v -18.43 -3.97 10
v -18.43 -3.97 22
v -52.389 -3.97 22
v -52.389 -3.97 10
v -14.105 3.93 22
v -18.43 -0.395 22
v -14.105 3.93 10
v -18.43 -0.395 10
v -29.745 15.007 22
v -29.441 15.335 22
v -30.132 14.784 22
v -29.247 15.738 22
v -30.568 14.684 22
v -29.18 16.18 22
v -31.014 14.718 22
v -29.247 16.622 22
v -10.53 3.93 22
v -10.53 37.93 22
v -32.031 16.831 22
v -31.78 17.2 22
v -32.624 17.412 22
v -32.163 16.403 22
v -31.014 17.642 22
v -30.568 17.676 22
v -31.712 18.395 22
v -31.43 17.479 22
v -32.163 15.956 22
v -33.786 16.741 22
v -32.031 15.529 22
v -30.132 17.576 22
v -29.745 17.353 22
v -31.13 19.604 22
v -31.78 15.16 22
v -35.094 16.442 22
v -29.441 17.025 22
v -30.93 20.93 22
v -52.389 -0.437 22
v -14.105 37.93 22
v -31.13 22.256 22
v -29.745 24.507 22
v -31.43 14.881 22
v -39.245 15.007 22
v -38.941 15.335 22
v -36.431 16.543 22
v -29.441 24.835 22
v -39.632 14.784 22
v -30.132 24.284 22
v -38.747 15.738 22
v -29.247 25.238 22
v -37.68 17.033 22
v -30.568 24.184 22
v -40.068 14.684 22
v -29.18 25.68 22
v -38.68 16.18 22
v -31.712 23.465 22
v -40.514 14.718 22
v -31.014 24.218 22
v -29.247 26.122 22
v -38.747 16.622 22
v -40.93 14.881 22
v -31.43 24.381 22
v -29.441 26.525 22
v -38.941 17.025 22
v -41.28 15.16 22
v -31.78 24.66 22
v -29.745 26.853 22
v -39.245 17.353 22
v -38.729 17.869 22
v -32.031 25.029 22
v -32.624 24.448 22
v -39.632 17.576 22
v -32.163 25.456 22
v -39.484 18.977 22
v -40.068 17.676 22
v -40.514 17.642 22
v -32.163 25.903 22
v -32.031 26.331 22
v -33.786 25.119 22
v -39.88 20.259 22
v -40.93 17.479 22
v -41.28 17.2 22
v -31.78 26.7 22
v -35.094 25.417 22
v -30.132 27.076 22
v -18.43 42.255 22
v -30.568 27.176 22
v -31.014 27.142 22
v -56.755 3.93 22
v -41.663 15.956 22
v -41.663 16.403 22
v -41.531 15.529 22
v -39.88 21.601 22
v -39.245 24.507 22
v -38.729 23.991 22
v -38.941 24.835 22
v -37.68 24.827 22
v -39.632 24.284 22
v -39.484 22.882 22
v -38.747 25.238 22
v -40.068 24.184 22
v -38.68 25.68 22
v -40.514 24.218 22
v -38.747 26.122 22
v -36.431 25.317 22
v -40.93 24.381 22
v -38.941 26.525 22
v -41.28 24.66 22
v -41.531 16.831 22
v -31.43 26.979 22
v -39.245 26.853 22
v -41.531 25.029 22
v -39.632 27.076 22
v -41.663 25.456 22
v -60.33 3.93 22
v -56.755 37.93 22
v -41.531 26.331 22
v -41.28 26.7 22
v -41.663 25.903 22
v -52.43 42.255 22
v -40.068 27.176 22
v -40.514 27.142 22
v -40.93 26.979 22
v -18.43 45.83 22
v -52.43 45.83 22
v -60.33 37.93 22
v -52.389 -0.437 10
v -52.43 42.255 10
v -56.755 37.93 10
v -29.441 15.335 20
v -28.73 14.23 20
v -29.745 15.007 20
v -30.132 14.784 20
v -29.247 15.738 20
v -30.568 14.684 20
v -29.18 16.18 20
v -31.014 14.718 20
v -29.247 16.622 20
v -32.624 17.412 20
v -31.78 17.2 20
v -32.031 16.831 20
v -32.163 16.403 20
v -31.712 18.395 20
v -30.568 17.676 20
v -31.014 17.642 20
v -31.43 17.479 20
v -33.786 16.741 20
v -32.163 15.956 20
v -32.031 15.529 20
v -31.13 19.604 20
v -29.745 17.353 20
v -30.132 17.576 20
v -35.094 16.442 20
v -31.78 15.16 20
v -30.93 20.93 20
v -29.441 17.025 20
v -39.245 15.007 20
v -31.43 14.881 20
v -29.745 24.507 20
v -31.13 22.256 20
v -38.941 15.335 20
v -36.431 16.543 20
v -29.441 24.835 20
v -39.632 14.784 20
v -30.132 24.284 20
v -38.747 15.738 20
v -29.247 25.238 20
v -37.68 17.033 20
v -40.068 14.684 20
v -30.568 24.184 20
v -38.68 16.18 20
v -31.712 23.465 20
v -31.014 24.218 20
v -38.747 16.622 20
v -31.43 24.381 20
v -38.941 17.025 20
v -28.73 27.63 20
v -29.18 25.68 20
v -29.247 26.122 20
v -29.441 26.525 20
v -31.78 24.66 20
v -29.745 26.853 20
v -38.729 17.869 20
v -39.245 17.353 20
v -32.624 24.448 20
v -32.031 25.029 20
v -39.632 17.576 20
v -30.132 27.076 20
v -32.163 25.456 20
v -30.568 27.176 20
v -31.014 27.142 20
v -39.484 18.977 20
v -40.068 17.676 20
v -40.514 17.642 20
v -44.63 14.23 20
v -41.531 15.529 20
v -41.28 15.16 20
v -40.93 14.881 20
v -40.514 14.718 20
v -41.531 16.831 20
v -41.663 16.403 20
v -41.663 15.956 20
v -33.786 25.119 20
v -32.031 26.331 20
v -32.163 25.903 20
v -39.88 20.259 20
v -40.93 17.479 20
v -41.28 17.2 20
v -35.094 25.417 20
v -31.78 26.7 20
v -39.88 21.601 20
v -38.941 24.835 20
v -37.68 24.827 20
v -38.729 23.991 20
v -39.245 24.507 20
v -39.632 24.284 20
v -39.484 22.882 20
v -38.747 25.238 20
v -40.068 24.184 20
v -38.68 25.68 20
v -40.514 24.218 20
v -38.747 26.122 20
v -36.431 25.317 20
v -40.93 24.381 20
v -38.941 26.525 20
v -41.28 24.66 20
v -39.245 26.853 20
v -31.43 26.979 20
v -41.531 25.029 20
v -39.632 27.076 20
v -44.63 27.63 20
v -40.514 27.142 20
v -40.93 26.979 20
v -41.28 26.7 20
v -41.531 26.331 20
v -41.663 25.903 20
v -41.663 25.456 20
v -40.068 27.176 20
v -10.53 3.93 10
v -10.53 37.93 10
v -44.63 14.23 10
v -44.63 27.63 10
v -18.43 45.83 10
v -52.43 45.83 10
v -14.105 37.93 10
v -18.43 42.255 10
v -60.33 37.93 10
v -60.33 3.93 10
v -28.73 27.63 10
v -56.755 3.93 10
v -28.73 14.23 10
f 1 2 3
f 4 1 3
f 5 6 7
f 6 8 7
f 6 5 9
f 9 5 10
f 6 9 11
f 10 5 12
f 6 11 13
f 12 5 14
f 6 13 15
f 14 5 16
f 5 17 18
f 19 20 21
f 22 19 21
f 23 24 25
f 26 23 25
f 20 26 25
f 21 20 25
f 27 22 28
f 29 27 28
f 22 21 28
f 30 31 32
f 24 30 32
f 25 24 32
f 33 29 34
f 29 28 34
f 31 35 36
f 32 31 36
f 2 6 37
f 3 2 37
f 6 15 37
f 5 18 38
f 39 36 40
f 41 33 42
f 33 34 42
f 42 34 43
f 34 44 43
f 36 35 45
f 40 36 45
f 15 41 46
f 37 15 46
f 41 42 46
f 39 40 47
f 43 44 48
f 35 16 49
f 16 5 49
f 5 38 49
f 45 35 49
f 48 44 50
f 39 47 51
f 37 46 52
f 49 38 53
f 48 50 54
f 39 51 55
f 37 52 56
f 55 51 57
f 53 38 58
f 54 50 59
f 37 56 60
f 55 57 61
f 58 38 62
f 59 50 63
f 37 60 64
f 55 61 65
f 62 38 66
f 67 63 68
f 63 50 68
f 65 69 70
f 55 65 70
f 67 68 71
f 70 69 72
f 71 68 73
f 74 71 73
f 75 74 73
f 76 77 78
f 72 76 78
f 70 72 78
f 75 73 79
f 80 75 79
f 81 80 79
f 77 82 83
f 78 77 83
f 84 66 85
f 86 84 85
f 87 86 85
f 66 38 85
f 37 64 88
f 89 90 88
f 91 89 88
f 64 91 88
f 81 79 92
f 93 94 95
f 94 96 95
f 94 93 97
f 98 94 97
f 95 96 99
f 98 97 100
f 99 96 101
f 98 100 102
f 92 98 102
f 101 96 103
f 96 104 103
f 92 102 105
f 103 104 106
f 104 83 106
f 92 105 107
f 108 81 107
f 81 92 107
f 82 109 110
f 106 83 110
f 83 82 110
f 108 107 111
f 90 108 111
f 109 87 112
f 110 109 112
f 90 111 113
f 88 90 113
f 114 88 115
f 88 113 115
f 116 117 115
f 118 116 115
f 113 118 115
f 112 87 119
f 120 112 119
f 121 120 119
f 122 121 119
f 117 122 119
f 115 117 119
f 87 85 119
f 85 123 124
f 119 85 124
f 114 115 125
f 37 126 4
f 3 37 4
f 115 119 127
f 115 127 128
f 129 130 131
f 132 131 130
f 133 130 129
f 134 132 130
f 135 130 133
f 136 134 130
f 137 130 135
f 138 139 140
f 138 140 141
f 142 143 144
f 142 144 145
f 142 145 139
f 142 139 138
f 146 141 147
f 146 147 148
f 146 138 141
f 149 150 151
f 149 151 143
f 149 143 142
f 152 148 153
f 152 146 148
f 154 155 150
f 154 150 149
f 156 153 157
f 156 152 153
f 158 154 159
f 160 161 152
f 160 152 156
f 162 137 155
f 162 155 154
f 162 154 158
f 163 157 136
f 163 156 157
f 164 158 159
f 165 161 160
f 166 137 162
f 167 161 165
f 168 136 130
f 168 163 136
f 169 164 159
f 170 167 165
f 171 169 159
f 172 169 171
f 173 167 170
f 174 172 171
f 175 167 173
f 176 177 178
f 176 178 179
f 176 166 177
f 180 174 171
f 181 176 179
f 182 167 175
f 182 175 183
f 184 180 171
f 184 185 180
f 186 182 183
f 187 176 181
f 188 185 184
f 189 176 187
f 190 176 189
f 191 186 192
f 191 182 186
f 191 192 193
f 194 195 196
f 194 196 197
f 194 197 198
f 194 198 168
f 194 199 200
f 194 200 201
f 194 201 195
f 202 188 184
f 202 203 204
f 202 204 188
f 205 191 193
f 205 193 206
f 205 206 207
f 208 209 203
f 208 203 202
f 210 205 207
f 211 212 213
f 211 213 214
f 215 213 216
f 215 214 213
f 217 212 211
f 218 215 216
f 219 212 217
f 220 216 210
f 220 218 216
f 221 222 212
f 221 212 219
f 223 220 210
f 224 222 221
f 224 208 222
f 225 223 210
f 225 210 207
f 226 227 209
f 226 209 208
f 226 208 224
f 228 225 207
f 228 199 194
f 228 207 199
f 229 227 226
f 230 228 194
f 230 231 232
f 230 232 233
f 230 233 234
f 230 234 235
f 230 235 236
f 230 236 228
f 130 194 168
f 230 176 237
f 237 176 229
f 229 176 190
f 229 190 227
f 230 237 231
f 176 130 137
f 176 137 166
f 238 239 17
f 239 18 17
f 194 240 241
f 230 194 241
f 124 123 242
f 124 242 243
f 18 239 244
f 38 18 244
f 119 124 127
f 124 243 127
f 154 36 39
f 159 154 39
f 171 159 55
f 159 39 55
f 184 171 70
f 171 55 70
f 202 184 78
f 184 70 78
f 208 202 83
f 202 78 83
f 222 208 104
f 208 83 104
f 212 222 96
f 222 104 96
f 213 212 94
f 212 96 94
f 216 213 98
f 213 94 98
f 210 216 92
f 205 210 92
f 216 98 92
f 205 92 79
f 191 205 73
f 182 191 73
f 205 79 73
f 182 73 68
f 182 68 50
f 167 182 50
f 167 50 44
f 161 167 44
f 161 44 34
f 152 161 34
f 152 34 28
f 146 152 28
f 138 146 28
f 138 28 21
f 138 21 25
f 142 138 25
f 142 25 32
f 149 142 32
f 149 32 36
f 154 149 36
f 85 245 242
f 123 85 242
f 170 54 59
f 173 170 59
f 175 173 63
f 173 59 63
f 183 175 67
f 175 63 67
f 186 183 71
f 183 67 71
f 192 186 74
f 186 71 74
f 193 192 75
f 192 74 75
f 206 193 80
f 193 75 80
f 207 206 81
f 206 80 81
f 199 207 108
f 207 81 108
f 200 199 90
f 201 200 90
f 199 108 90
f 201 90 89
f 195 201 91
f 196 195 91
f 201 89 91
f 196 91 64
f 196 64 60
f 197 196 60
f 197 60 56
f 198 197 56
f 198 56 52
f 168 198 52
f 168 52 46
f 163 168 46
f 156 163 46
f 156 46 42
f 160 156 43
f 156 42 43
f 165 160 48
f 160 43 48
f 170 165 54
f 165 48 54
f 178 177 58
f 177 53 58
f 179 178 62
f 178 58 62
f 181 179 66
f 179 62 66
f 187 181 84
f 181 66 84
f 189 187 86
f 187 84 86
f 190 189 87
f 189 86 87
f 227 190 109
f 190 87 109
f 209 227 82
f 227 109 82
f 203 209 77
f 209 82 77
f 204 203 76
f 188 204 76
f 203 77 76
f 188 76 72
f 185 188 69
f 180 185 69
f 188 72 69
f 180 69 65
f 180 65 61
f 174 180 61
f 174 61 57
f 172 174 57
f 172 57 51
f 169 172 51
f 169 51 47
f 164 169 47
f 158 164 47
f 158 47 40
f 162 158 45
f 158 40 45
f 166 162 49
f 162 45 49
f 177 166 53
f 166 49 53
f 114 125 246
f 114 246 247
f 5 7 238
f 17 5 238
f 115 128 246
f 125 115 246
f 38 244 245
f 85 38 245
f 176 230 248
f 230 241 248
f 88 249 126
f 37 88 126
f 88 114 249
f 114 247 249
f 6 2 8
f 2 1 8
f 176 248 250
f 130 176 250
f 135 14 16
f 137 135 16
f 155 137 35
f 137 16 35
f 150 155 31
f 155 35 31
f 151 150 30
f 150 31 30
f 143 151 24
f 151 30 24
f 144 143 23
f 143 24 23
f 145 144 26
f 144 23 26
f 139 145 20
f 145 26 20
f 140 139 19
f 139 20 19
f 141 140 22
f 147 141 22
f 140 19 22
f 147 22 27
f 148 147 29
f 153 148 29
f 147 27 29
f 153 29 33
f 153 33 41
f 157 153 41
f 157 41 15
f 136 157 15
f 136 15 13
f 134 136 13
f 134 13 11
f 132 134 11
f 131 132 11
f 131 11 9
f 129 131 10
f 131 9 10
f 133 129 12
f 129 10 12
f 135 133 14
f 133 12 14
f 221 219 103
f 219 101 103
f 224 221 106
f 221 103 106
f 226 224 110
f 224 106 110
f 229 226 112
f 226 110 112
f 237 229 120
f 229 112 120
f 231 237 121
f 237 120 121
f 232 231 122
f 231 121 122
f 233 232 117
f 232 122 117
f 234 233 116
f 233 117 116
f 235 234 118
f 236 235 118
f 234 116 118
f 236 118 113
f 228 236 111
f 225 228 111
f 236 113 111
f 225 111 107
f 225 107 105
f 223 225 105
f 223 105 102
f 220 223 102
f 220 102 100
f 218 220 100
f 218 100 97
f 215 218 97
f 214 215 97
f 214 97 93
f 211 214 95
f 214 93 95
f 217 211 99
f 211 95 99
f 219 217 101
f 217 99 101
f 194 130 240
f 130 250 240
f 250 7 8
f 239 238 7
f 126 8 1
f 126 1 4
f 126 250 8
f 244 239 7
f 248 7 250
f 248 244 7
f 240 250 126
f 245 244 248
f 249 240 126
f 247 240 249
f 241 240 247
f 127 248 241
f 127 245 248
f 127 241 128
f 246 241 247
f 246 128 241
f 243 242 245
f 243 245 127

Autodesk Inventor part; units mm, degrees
ref_plane "YZ Plane" through (0, 0, 0) normal (1, 0, 0) x (0, 1, 0)
ref_plane "XZ Plane" through (0, 0, 0) normal (0, 1, 0) x (-1, 0, 0)
ref_plane "Work Plane1" through (-56.3599, 0, 22) normal (0, 0, -1) x (-1, 0, 0)
sketch "Sketch1" plane through (-56.3599, 0, 22) normal (0, 0, -1) x (-1, 0, 0)
  line L0 (-4.0299, -0.3538) -> (-2.2322, 1.4439) construction
  arc A0 (-1.4439, 2.2322) -> (-2.2322, 1.4439) centre (-0.9299, 0.9299) ccw construction
  line L1 (-1.4439, 2.2322) -> (0.3538, 4.0299) construction
  line L2 (-37.8299, 42.8299) -> (-37.8299, 37.8299) construction
  line L3 (-37.8299, 37.8299) -> (-42.9208, 37.8299) construction
  line L4 (-37.8299, 42.2137) -> (-37.8299, 45.8299) construction
  line L5 (-37.8299, 45.8299) -> (-4.0299, 45.8299) construction
  line L6 (-4.0299, 45.8299) -> (-4.0299, 42.2137) construction
  line L7 (-4.0299, 4.0299) -> (0.3538, 4.0299) projected
  circle A1 centre (-20.9299, 20.9299) radius 17.5 projected
  line L8 (-20.9299, 58.9723) -> (17.1124, 20.9299) construction
  line L9 (17.1124, 20.9299) -> (-20.9299, -17.1124) construction
  line L10 (-20.9299, -17.1124) -> (-58.9723, 20.9299) construction
  line L11 (-58.9723, 20.9299) -> (-20.9299, 58.9723) construction
  line L12 (-20.9299, 58.9723) -> (-20.9299, -17.1124) construction
  line L13 (17.1124, 20.9299) -> (-58.9723, 20.9299) construction
  line L14 (-20.9299, 58.9723) -> (32.8701, 58.9723) construction
  line L15 (-43.4299, 43.4299) -> (1.5701, 43.4299) construction
  line L16 (1.5701, 43.4299) -> (1.5701, -1.5701) construction
  line L17 (1.5701, -1.5701) -> (-43.4299, -1.5701) construction
  line L18 (-43.4299, -1.5701) -> (-43.4299, 43.4299) construction
  line L19 (-43.4299, 43.4299) -> (1.5701, -1.5701) construction
  line L20 (1.5701, 43.4299) -> (-43.4299, -1.5701) construction
  line L21 (-43.4299, 5.3876) -> (-43.4299, 36.4723)
  line L22 (-43.4299, 36.4723) -> (-36.4723, 43.4299)
  line L23 (-36.4723, 43.4299) -> (-5.3876, 43.4299)
  line L24 (-5.3876, 43.4299) -> (1.5701, 36.4723)
  line L25 (1.5701, 36.4723) -> (1.5701, 5.3876)
  line L26 (1.5701, 5.3876) -> (-5.3876, -1.5701)
  line L27 (-5.3876, -1.5701) -> (-36.4723, -1.5701)
  line L28 (-36.4723, -1.5701) -> (-43.4299, 5.3876)
  line L29 (-4.0299, 42.2137) -> (-37.8299, 42.2137) projected
  line L30 (-4.0299, -0.3538) -> (-4.0299, 4.0299) projected
  circle A2 centre (-20.9299, 20.9299) radius 1.5
  line L31 (-10.9299, 10.9299) -> (-30.9299, 10.9299) construction
  line L32 (-30.9299, 10.9299) -> (-30.9299, 30.9299) construction
  line L33 (-30.9299, 30.9299) -> (-10.9299, 30.9299) construction
  line L34 (-10.9299, 30.9299) -> (-10.9299, 10.9299) construction
  line L35 (-10.9299, 10.9299) -> (-30.9299, 30.9299) construction
  line L36 (-30.9299, 10.9299) -> (-10.9299, 30.9299) construction
  circle A3 centre (-30.9299, 30.9299) radius 1.4
  circle A4 centre (-30.9299, 10.9299) radius 1.4
  circle A5 centre (-10.9299, 10.9299) radius 1.4
  line L37 (-45.8299, 37.8299) -> (-42.0723, 37.8299) construction
  line L38 (-42.1723, 37.7299) -> (-45.8299, 37.7299)
  line L39 (-45.8299, 37.7299) -> (-45.8299, 4.1299)
  line L40 (-45.8299, 4.1299) -> (-42.1723, 4.1299)
  line L41 (-42.1723, 4.1299) -> (-42.1723, 37.7299)
  line L42 (-45.8299, 4.0299) -> (-42.0723, 4.0299) construction
  line L43 (-45.8299, 37.8299) -> (-42.0723, 37.8299) projected
  line L44 (-37.7299, 45.8299) -> (-4.1299, 45.8299)
  line L45 (-4.1299, 45.8299) -> (-4.1299, 42.1723)
  line L46 (-4.1299, 42.1723) -> (-37.7299, 42.1723)
  line L47 (-37.7299, 42.1723) -> (-37.7299, 45.8299)
  line L48 (0.4701, 37.8299) -> (0.4701, 4.0299) construction
  line L49 (0.4701, 4.0299) -> (3.9701, 4.0299) construction
  line L50 (3.9701, 37.8299) -> (3.9701, 4.0299) construction
  line L51 (0.4701, 37.8299) -> (3.9701, 37.8299) construction
  line L52 (-45.8299, -3.9701) -> (-4.0299, -3.9701) construction
  line L53 (0.3124, 37.7299) -> (3.9701, 37.7299)
  line L54 (3.9701, 37.7299) -> (3.9701, 4.1299)
  line L55 (3.9701, 4.1299) -> (0.3124, 4.1299)
  line L56 (0.3124, 4.1299) -> (0.3124, 37.7299)
  line L57 (-4.1713, -0.3538) -> (-37.7299, -0.3538)
  line L58 (-37.7299, -0.3538) -> (-37.7299, -3.9701)
  line L59 (-37.7299, -3.9701) -> (-4.1713, -3.9701)
  line L60 (-4.1713, -3.9701) -> (-4.1713, -0.3538)
  point P0 (-37.8299, 4.0299)
  dimension "d18" = 53.8
  dimension "d19" = 45
  dimension "d20" = 53.8
  dimension "d21" = 45
  dimension "d22" = 45
  dimension "d30" = 20
  dimension "d31" = 20
  dimension "d32" = 2.8
  dimension "d33" = 2.8
  dimension "d34" = 2.8
  dimension "d35" = 3
  dimension "d36" = 0.1
  dimension "d37" = 0.1
  dimension "d38" = 0.1
  dimension "d39" = 0.1
extrude "Extrusion1" add sketch "Sketch1" along normal blind 12 contours L30 L26 L57 L28 L41 L22 L46 L24 L56 L7 | L7 L26 L30 | L56 L24 L25 L26 | L26 L25 L24 L53 L54 L55 | L60 L59 L58 L57 L28 L27 L26 | L26 L27 L28 L57 | L46 L22 L29 L24 | L24 L29 L45 | L40 L39 L38 L22 L21 L28 | L28 L21 L22 L41 | L29 L22 L23 L24 | L24 L23 L22 L29 L47 L44 L45 | L47 L29 L22 | A1 | A2 | A3 | A4 | A5
sketch "Skizze4" plane through (-56.3599, 0, 10) normal (0, 0, -1) x (-1, 0, 0)
  line L0 (-37.7299, 42.1723) -> (-42.1723, 37.7299) projected
  line L1 (-42.1723, 37.7299) -> (-45.8299, 37.7299) projected
  line L2 (-45.8299, 37.7299) -> (-45.8299, 4.1299) construction
  line L3 (-45.8299, 4.1299) -> (-42.1723, 4.1299) projected
  line L4 (-42.1723, 4.1299) -> (-37.6885, -0.3538) projected
  line L5 (-37.6885, -0.3538) -> (-37.7299, -0.3538) projected
  line L6 (-37.7299, -0.3538) -> (-37.7299, -3.9701) projected
  line L7 (-37.7299, -3.9701) -> (-4.1713, -3.9701) construction
  line L8 (-4.1713, -3.9701) -> (-4.1713, -0.3538) projected
  line L9 (-4.1713, -0.3538) -> (0.3124, 4.1299) projected
  line L10 (0.3124, 4.1299) -> (3.9701, 4.1299) projected
  line L11 (3.9701, 4.1299) -> (3.9701, 37.7299) construction
  line L12 (3.9701, 37.7299) -> (0.3124, 37.7299) projected
  line L13 (0.3124, 37.7299) -> (-4.1299, 42.1723) projected
  line L14 (-4.1299, 42.1723) -> (-4.1299, 45.8299) projected
  line L15 (-4.1299, 45.8299) -> (-37.7299, 45.8299) construction
  line L16 (-37.7299, 45.8299) -> (-37.7299, 42.1723) projected
  line L17 (-37.9299, 46.0299) -> (-3.9299, 46.0299) construction
  line L18 (-3.9299, 46.0299) -> (-3.9299, 42.2551)
  line L19 (-3.9299, 42.2551) -> (0.3953, 37.9299)
  line L20 (0.3953, 37.9299) -> (4.1701, 37.9299)
  line L21 (4.1701, 37.9299) -> (4.1701, 3.9299) construction
  line L22 (4.1701, 3.9299) -> (0.3953, 3.9299)
  line L23 (0.3953, 3.9299) -> (-3.9713, -0.4367)
  line L24 (-3.9713, -0.4367) -> (-3.9713, -4.1701)
  line L25 (-3.9713, -4.1701) -> (-37.9299, -4.1701) construction
  line L26 (-37.9299, -4.1701) -> (-37.9299, -0.3953)
  line L27 (-37.9299, -0.3953) -> (-42.2551, 3.9299)
  line L28 (-42.2551, 3.9299) -> (-46.0299, 3.9299)
  line L29 (-46.0299, 3.9299) -> (-46.0299, 37.9299) construction
  line L30 (-46.0299, 37.9299) -> (-42.2551, 37.9299)
  line L31 (-42.2551, 37.9299) -> (-37.9299, 42.2551)
  line L32 (-37.9299, 42.2551) -> (-37.9299, 46.0299)
  line L33 (-45.8299, 37.7299) -> (-45.8299, 37.9299)
  line L34 (-4.1299, 45.8299) -> (-37.7299, 45.8299) projected
  line L35 (-37.7299, 45.8299) -> (-37.9299, 45.8299)
  line L36 (-4.1299, 45.8299) -> (-3.9299, 45.8299)
  line L37 (3.9701, 37.7299) -> (3.9701, 37.9299)
  line L38 (3.9701, 4.1299) -> (3.9701, 37.7299) projected
  line L39 (3.9701, 4.1299) -> (3.9701, 3.9299)
  line L40 (-4.1713, -3.9701) -> (-3.9713, -3.9701)
  line L41 (-37.7299, -3.9701) -> (-37.9299, -3.9701)
  line L42 (-45.8299, 4.1299) -> (-45.8299, 3.9299)
  point P0 (-56.3599, 0)
  dimension "d40" = 0.2
extrude "IM_offset" add sketch "Skizze4" against normal up to surface (12 mm away)
ref_plane "Arbeitsebene5" through (-35.4299, 3.9299, 22) normal (-1, 0, 0) x (0, 0, 1)
ref_plane "Arbeitsebene6" through (-18.4299, 20.9299, 22) normal (0, 1, 0) x (-1, 0, 0)
sketch "Skizze31" plane through (-56.3599, 0, 10) normal (0, 0, -1) x (-1, 0, 0)
  line L0 (3.9701, 3.9299) -> (3.9701, 37.9299) projected
  line L1 (3.9701, 37.9299) -> (0.3953, 37.9299) projected
  line L2 (0.3953, 37.9299) -> (-3.9299, 42.2551) projected
  line L3 (-3.9299, 42.2551) -> (-3.9299, 45.8299) projected
  line L4 (-3.9299, 45.8299) -> (-37.9299, 45.8299) projected
  line L5 (-37.9299, 45.8299) -> (-37.9299, 42.2551) projected
  line L6 (-37.9299, 42.2551) -> (-42.2551, 37.9299) projected
  line L7 (-42.2551, 37.9299) -> (-45.8299, 37.9299) projected
  line L8 (-45.8299, 37.9299) -> (-45.8299, 3.9299) projected
  line L9 (-42.2551, 3.9299) -> (-45.8299, 3.9299) projected
  line L10 (-37.9299, -0.3953) -> (-42.2551, 3.9299) projected
  line L11 (-37.9299, -3.9701) -> (-37.9299, -0.3953) projected
  line L12 (-3.9713, -3.9701) -> (-37.9299, -3.9701) projected
  line L13 (-3.9713, -3.9701) -> (-3.9713, -0.4367) projected
  line L14 (-3.9713, -0.4367) -> (0.3953, 3.9299) projected
  line L15 (0.3953, 3.9299) -> (3.9701, 3.9299) projected
  line L16 (-11.9299, 27.4299) -> (-27.4299, 27.4299) projected
  line L17 (-11.9299, 14.4299) -> (-11.9299, 27.4299) projected
  line L18 (-27.4299, 14.4299) -> (-11.9299, 14.4299) projected
  line L19 (-27.4299, 27.4299) -> (-27.4299, 14.4299) projected
  circle A0 centre (-20.9299, 20.9299) radius 4.5 projected
  circle A1 centre (-25.6799, 25.6799) radius 0.75 projected
  circle A2 centre (-25.6799, 16.1799) radius 0.75 projected
  circle A3 centre (-16.1799, 16.1799) radius 0.75 projected
  circle A4 centre (-16.1799, 25.6799) radius 0.75 projected
  line L20 (-27.6299, 14.2299) -> (-11.7299, 14.2299)
  line L21 (-11.7299, 14.2299) -> (-11.7299, 27.6299)
  line L22 (-11.7299, 27.6299) -> (-27.6299, 27.6299)
  line L23 (-27.6299, 27.6299) -> (-27.6299, 14.2299)
  point P0 (-56.3599, 0)
  dimension "d184" = 0.2
extrude "Extrusion26" cut sketch "Skizze31" against normal blind 10 contours L17 L18 L19 L16 | A0 | A1 | A2 | A3 | A4 | L23 L22 L21 L20
sketch "Skizze32" plane through (-56.3599, 0, 22) normal (0, 0, 1) x (1, 0, 0)
  circle A0 centre (20.9299, 20.9299) radius 4.5 projected
  circle A1 centre (25.6799, 25.6799) radius 1.25 projected
  circle A2 centre (16.1799, 16.1799) radius 1.25 projected
  circle A3 centre (25.6799, 16.1799) radius 1.25 projected
  circle A4 centre (16.1799, 25.6799) radius 1.25 projected
  line L0 (14.4299, 27.4299) -> (27.4299, 27.4299) projected
  line L1 (27.4299, 27.4299) -> (27.4299, 14.4299) projected
  line L2 (27.4299, 14.4299) -> (14.4299, 14.4299) projected
  line L3 (14.4299, 14.4299) -> (14.4299, 27.4299) projected
  circle A5 centre (16.1799, 25.6799) radius 1.25
  circle A6 centre (16.1799, 25.6799) radius 1.5
  circle A7 centre (25.6799, 25.6799) radius 1.5
  circle A8 centre (25.6799, 16.1799) radius 1.5
  circle A9 centre (16.1799, 16.1799) radius 1.5
  point P0 (56.3599, 0)
  dimension "d187" = 13
  dimension "d188" = 13
  dimension "d189" = 9
  dimension "d190" = 2.5
  dimension "d191" = 1.75
  dimension "d192" = 9.5
  dimension "d193" = 1.75
  dimension "d194" = 3
  dimension "d195" = 3
  dimension "d196" = 3
  dimension "d197" = 3
extrude "Extrusion27" cut sketch "Skizze32" against normal blind 10 contours A0 | A1 | A2 | A3 | A4 | A6 | A7 | A8 | A9
properties part number "20_Cube_Insert_Lasertack_mount_v3"
